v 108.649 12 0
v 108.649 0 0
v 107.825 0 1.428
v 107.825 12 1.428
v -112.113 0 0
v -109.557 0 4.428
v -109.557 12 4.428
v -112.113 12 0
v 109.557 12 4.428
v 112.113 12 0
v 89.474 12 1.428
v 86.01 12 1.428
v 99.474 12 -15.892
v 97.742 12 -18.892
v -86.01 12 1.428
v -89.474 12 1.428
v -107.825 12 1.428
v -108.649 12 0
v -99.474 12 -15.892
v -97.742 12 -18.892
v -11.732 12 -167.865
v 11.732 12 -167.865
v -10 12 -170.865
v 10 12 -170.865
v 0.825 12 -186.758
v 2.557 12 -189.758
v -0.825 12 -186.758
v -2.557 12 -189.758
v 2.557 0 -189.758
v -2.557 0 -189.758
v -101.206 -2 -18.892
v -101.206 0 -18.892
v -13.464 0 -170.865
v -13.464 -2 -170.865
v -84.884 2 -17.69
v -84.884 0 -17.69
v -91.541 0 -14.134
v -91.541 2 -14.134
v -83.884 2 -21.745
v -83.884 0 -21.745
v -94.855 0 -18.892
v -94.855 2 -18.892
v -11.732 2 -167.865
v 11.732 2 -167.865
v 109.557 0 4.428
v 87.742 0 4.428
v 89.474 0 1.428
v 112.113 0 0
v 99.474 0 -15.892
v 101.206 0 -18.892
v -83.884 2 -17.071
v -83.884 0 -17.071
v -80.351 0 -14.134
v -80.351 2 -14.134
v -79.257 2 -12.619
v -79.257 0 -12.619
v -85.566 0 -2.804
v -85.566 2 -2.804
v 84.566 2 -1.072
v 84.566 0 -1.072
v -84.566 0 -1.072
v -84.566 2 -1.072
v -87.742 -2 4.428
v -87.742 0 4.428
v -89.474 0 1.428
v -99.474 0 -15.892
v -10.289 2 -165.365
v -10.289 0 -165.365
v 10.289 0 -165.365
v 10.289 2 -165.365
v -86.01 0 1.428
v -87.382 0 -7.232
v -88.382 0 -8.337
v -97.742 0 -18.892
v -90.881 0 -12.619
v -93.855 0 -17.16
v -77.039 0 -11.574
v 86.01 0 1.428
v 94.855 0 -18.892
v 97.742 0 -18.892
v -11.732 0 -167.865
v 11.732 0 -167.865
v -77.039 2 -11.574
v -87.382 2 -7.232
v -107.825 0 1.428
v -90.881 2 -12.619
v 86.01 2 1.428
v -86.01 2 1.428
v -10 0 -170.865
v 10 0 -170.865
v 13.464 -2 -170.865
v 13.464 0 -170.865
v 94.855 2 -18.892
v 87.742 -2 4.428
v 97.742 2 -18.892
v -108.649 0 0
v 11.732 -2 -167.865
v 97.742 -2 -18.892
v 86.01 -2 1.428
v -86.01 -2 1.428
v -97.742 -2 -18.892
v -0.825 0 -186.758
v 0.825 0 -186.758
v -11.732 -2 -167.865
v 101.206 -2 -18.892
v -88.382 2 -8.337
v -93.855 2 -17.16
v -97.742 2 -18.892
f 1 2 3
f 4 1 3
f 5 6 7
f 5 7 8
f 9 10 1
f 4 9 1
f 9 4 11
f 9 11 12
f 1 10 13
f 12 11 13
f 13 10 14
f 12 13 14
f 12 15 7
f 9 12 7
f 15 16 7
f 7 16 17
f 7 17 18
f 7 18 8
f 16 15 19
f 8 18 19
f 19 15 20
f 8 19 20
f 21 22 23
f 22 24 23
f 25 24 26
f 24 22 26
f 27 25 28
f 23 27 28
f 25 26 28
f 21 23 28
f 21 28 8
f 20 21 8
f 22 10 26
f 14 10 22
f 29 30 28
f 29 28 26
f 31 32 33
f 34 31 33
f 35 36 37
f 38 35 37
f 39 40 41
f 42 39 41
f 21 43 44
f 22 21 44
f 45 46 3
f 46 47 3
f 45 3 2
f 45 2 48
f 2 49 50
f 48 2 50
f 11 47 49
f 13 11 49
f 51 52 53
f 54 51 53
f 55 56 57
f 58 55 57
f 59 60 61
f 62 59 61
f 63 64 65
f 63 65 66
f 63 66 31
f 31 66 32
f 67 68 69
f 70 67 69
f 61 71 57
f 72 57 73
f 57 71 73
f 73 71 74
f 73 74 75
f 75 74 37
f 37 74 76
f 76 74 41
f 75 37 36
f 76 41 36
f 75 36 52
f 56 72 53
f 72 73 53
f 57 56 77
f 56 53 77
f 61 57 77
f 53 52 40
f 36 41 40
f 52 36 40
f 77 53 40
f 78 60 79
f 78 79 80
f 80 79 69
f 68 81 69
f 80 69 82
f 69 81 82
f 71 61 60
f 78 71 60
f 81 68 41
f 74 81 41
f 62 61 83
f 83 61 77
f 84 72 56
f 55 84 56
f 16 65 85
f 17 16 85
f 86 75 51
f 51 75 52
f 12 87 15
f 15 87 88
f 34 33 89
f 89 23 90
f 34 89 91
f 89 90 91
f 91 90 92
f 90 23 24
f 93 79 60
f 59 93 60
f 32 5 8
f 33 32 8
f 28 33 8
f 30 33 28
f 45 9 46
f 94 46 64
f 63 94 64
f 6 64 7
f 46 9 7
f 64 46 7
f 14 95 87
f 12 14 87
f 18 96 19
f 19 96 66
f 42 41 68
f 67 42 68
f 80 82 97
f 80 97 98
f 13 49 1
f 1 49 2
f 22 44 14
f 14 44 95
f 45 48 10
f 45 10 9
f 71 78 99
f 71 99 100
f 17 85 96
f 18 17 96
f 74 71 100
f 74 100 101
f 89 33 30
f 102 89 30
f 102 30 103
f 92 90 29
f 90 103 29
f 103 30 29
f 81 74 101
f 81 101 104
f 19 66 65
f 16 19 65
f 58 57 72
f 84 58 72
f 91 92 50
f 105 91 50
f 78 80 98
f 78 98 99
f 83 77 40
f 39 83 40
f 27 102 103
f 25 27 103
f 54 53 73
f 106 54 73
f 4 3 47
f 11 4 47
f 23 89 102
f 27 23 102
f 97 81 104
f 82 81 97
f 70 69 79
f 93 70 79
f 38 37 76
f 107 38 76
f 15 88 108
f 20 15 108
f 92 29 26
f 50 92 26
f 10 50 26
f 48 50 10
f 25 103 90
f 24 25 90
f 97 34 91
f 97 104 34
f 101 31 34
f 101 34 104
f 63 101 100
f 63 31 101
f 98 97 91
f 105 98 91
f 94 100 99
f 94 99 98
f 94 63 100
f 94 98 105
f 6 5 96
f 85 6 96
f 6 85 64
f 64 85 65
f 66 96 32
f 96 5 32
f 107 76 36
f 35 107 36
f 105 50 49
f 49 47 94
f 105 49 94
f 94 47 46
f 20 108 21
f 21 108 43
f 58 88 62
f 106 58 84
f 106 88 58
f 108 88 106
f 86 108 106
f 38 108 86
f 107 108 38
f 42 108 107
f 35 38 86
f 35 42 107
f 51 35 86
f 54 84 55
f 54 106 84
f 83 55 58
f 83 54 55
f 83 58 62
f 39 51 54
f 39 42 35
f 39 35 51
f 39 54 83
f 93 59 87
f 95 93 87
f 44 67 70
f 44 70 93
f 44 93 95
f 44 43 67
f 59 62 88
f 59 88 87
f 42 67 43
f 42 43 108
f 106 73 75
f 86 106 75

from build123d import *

# Parameters (mm, degrees)
BOSS_EXTRUDE1_DEPTH = 12
BOSS_EXTRUDE2_DEPTH = 2
BOSS_EXTRUDE3_DEPTH = 2


with BuildPart() as part:
    # Sketch1 → Boss-Extrude1 (new body)
    with BuildSketch(Plane(origin=(0, 0, 0), x_dir=(1, 0, 0), z_dir=(0, 1, 0))):
        Polygon((109.556624327, -4.42820323), (-109.556624327, -4.42820323), (-112.113248654, 0), (-2.556624327, 189.75763964), (2.556624327, 189.75763964), (112.113248654, 0), align=None)
        Polygon((-107.824573519, -1.42820323), (-108.649147039, 0), (-99.473720558, 15.892304845), (-89.473720558, -1.42820323), align=None, mode=Mode.SUBTRACT)
        Polygon((-0.824573519, 186.75763964), (0.824573519, 186.75763964), (10, 170.865334795), (-10, 170.865334795), align=None, mode=Mode.SUBTRACT)
        Polygon((108.649147039, 0), (107.824573519, -1.42820323), (89.473720558, -1.42820323), (99.473720558, 15.892304845), align=None, mode=Mode.SUBTRACT)
        Polygon((-11.732050808, 167.865334795), (11.732050808, 167.865334795), (97.741669751, 18.892304845), (86.009618943, -1.42820323), (-86.009618943, -1.42820323), (-97.741669751, 18.892304845), align=None, mode=Mode.SUBTRACT)
    extrude(amount=BOSS_EXTRUDE1_DEPTH)

    # Sketch1<4> → Boss-Extrude2 (add)
    with BuildSketch(Plane(origin=(0, 0, 0), x_dir=(1, 0, 0), z_dir=(0, 1, 0))):
        Polygon((11.732050808, 167.865334795), (-11.732050808, 167.865334795), (-97.741669751, 18.892304845), (-86.009618943, -1.42820323), (86.009618943, -1.42820323), (97.741669751, 18.892304845), align=None)
        Polygon((-88.382267396, 8.337401941), (-90.881111336, 12.619059055), (-83.883666799, 17.070781447), (-80.350783684, 14.134361385), align=None, mode=Mode.SUBTRACT)
        Polygon((-84.88364511, 17.690172506), (-91.540804962, 14.134361385), (-93.854918405, 17.160254038), align=None, mode=Mode.SUBTRACT)
        Polygon((-87.382389068, 7.232050808), (-79.257069687, 12.619059055), (-85.56624327, 2.803847577), align=None, mode=Mode.SUBTRACT)
        Polygon((84.56624327, 1.07179677), (-84.56624327, 1.07179677), (-77.039200778, 11.574081455), (-83.883666799, 21.745187386), (-94.854918405, 18.892304845), (-10.288675135, 165.365334795), (10.288675135, 165.365334795), (94.854918405, 18.892304845), align=None, mode=Mode.SUBTRACT)
    extrude(amount=BOSS_EXTRUDE2_DEPTH)

    # Sketch2 → Boss-Extrude3 (add)
    with BuildSketch(Plane.XZ):
        Polygon((101.205771366, -18.892304845), (87.741669751, 4.42820323), (-87.741669751, 4.42820323), (-101.205771366, -18.892304845), (-13.464101615, -170.865334795), (13.464101615, -170.865334795), align=None)
        Polygon((-11.732050807, -167.865334795), (11.732050807, -167.865334795), (97.741669751, -18.892304845), (86.009618943, 1.42820323), (-86.009618943, 1.42820323), (-97.741669751, -18.892304845), align=None, mode=Mode.SUBTRACT)
    extrude(amount=BOSS_EXTRUDE3_DEPTH)


solid = part.part
